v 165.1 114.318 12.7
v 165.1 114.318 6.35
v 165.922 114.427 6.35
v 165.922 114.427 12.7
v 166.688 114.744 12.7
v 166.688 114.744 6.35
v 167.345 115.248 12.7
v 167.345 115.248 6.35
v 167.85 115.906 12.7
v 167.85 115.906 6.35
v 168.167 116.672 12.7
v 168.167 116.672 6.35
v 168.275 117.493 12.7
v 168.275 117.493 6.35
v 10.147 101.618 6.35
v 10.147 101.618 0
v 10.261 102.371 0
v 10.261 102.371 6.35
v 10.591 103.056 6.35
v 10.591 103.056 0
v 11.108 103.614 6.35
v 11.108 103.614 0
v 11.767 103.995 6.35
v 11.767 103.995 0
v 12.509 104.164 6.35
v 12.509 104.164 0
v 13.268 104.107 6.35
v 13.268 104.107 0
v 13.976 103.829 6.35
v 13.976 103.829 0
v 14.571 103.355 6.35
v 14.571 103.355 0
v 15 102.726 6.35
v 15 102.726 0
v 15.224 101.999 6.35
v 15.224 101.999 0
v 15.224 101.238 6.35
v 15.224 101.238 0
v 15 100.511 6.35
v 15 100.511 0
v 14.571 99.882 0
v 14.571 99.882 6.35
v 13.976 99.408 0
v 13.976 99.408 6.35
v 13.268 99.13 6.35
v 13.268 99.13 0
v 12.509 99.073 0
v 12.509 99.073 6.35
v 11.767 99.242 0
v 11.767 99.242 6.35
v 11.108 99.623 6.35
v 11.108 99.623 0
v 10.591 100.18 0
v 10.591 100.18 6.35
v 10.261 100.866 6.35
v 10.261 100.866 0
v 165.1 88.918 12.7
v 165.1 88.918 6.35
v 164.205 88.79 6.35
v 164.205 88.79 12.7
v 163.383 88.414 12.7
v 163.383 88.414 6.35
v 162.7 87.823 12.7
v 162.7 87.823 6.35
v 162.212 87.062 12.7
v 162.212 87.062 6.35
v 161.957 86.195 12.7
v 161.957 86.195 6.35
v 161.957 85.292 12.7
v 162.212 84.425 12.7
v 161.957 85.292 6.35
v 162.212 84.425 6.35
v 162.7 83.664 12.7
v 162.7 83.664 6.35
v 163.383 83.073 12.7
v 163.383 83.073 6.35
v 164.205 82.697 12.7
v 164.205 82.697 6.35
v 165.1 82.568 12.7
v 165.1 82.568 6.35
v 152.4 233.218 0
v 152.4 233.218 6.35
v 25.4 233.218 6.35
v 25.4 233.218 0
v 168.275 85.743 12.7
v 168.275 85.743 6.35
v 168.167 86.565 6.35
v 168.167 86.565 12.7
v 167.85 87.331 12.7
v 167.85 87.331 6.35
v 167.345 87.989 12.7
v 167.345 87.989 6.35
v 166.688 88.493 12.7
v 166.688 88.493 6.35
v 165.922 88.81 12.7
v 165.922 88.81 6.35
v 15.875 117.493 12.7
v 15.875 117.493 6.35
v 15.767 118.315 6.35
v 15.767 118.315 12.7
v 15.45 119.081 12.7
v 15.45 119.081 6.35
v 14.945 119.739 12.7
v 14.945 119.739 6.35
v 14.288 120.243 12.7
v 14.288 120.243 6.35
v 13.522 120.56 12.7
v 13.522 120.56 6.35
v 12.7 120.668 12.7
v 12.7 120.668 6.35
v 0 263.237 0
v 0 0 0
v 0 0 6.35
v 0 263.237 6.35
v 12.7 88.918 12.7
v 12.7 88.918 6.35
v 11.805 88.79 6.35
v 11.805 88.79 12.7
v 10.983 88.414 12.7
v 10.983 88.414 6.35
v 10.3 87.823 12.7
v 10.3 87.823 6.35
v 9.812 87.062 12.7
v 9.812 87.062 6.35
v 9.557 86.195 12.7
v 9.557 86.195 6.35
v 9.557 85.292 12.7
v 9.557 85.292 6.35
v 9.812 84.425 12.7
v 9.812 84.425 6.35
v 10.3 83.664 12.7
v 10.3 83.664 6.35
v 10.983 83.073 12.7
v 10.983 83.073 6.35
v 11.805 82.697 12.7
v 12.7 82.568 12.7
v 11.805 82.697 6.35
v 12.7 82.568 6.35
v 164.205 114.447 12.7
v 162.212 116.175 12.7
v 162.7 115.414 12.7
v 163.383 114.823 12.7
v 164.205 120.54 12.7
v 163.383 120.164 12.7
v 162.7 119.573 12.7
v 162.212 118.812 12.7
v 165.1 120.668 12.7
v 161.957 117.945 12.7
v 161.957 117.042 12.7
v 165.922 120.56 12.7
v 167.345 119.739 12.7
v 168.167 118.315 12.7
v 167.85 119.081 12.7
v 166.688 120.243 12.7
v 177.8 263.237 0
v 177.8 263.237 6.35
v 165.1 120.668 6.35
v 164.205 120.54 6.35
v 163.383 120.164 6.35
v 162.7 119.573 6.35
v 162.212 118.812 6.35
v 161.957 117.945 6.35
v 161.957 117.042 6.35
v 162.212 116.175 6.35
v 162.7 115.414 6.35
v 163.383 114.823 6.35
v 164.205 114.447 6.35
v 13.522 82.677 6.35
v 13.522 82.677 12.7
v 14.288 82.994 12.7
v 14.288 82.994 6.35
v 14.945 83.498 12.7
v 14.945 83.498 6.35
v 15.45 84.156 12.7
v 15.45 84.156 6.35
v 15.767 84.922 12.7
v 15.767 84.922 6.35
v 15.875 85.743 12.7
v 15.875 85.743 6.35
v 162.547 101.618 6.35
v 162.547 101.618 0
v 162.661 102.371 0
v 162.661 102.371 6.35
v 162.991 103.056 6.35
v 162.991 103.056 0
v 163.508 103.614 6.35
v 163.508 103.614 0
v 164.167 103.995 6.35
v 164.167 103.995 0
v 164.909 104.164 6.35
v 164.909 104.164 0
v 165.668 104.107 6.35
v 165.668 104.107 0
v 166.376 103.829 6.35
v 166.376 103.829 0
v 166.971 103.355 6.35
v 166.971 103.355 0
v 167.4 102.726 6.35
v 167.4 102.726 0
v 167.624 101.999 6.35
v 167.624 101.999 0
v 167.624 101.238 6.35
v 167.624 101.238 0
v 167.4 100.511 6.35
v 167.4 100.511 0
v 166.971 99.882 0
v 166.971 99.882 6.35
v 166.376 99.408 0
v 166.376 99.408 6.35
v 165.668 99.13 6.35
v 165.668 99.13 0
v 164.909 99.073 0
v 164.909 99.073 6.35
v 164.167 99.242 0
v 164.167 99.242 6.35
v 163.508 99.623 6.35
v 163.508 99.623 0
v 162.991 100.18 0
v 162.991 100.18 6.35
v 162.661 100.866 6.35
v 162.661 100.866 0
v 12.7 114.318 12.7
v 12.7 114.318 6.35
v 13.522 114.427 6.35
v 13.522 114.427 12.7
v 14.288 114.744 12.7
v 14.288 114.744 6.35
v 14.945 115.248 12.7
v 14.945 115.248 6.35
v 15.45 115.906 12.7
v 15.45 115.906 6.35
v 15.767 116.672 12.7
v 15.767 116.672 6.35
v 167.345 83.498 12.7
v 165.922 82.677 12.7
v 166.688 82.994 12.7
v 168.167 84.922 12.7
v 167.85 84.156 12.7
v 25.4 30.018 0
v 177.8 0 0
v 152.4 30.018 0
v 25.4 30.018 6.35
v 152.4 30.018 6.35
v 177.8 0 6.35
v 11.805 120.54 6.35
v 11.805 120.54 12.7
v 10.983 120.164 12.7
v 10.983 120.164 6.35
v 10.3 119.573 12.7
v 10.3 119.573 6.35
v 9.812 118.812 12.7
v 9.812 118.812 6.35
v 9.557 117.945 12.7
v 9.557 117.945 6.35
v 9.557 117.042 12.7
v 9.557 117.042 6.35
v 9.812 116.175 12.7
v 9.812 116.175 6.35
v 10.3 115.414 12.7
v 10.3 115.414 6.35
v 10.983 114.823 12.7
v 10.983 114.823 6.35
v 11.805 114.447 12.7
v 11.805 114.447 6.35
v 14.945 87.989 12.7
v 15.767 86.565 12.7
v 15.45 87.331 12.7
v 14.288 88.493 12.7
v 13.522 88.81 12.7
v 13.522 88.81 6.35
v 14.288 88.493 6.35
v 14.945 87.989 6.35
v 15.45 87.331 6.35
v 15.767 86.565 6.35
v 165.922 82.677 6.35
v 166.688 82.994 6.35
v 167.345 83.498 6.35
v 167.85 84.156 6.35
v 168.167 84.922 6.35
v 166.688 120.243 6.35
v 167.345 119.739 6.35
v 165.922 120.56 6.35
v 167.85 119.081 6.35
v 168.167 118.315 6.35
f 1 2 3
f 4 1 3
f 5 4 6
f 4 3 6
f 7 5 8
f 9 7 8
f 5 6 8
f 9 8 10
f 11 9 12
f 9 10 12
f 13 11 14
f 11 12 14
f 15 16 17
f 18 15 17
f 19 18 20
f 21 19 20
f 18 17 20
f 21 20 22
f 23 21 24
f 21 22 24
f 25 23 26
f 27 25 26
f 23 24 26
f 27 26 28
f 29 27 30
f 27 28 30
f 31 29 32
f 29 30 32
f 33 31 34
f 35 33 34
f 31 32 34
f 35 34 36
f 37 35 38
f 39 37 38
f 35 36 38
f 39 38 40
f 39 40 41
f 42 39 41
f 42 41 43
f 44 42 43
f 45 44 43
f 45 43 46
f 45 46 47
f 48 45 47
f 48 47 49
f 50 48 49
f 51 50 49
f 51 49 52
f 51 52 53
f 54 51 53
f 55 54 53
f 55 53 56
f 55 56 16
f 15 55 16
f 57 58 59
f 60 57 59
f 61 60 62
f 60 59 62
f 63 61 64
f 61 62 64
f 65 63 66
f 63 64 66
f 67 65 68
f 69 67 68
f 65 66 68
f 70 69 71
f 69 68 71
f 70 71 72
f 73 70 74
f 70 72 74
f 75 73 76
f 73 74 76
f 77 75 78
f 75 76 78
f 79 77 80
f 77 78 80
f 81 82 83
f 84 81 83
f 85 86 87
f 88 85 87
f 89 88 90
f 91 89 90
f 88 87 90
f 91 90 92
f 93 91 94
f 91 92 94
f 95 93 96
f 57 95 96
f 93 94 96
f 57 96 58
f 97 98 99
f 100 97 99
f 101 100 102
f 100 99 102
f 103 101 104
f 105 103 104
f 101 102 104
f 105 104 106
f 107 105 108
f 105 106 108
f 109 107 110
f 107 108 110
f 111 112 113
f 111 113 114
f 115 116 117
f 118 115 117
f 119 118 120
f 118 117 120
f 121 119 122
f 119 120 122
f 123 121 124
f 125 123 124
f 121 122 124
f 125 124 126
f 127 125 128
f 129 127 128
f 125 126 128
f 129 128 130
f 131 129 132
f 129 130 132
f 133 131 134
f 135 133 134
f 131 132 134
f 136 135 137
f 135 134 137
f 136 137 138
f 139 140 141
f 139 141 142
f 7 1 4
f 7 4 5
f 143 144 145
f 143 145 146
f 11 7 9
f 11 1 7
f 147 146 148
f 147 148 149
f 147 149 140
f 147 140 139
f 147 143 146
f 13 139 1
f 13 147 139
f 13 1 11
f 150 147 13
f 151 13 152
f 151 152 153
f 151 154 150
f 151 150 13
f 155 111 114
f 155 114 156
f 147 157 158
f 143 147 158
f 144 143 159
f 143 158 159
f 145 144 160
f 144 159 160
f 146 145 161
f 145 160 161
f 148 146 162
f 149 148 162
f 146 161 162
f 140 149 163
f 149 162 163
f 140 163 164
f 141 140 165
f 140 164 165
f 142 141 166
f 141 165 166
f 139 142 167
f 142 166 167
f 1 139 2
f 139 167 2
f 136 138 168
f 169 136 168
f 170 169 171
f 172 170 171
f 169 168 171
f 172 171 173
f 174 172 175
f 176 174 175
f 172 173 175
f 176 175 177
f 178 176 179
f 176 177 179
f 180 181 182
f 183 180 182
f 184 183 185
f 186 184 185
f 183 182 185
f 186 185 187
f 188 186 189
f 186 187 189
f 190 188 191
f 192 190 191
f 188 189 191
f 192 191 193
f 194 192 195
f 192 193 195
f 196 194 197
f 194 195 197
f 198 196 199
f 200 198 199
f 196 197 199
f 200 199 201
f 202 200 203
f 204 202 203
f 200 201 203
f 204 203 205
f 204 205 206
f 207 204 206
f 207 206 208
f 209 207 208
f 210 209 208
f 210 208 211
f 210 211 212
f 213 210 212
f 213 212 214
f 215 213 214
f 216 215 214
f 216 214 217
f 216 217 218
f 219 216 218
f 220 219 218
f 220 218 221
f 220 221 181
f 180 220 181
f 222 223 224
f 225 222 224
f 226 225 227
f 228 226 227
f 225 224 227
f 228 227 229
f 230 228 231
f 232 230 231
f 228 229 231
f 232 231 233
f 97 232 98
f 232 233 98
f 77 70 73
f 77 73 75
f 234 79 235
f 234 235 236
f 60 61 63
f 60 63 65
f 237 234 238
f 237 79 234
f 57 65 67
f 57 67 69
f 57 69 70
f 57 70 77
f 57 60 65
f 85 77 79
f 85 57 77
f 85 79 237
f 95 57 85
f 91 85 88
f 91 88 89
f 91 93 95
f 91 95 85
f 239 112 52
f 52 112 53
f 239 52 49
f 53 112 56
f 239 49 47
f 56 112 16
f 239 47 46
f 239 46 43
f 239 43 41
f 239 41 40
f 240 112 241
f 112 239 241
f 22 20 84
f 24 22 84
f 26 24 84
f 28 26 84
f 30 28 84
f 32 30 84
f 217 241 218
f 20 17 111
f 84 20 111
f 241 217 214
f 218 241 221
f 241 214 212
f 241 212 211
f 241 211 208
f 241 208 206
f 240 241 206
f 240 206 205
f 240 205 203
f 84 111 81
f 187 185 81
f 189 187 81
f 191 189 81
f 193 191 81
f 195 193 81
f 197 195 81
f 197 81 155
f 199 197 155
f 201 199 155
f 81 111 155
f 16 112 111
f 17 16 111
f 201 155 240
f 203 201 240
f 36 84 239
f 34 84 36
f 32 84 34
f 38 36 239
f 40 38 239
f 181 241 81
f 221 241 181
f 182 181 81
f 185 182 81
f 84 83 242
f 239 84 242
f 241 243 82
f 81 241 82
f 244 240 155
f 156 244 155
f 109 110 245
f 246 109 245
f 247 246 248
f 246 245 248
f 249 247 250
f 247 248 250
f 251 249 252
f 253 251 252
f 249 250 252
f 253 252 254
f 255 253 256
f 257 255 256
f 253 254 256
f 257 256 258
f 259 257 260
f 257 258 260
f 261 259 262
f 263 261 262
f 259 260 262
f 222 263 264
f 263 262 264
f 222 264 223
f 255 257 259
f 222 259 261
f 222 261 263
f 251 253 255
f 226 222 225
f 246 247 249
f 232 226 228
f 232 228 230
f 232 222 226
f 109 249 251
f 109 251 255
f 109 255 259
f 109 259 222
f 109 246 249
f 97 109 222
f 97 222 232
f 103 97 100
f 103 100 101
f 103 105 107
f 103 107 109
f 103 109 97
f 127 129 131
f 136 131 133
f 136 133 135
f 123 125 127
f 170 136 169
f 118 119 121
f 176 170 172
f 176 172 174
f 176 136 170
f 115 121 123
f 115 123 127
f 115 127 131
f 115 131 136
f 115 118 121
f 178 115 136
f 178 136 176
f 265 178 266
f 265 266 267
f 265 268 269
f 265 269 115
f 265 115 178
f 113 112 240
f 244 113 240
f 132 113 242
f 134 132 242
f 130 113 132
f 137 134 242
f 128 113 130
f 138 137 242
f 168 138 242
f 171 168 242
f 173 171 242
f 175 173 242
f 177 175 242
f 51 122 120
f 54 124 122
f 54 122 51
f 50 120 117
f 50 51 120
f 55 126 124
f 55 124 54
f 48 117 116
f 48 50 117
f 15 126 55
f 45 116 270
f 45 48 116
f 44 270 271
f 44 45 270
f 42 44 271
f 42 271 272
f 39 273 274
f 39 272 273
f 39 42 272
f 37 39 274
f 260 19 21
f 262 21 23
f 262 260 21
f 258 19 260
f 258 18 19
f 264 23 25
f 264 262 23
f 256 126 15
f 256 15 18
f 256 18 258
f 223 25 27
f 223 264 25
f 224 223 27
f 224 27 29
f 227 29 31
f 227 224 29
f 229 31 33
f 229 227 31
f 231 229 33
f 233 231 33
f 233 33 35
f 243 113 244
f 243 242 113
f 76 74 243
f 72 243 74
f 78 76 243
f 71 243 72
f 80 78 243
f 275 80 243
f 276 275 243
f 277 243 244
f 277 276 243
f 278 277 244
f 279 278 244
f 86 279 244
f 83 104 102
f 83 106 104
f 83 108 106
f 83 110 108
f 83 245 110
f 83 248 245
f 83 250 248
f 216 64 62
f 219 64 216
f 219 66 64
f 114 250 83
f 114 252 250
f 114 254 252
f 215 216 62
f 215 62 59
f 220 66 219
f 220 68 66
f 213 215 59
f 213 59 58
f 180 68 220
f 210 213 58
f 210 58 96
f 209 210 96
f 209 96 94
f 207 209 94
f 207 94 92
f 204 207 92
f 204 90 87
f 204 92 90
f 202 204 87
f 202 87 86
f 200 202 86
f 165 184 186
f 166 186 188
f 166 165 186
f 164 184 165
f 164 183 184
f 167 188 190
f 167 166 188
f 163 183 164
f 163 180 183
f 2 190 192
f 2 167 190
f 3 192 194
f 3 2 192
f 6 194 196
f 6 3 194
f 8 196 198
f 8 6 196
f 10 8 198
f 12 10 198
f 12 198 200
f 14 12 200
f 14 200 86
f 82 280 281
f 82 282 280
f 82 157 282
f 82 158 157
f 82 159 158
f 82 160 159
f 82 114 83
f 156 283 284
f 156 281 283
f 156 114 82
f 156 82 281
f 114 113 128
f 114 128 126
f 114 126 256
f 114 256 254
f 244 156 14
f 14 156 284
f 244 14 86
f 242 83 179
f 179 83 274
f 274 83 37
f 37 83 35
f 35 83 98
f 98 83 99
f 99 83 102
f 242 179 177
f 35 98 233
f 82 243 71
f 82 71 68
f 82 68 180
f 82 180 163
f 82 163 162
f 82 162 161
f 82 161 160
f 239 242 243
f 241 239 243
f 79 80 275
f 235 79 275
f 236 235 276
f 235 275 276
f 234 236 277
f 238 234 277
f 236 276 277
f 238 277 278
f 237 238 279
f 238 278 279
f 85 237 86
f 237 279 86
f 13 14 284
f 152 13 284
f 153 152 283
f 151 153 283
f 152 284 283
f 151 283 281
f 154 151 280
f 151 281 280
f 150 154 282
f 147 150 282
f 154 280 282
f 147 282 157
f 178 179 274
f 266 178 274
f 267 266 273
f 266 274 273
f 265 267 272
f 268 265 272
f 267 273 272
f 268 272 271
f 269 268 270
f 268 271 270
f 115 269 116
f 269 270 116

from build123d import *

# Parameters (mm, degrees)
F0_W     = 177.8
F0_H     = 263.2369608608
F1_DEPTH = 6.35
F2_W     = 63.5
F2_H     = 101.6
F3_DEPTH = 25
F5_D     = 5.1054
F6_DEPTH = 6.35


with BuildPart() as f1:
    # F0 (on Top) → F1 (new body)
    with BuildSketch(Plane.XY):
        with Locations((88.9, 131.6184804304)):
            Rectangle(F0_W, F0_H)
    extrude(amount=F1_DEPTH)

    # F2 (on face) → F3 (cut)
    with BuildSketch(Plane.XY.offset(6.35)):
        with Locations((57.15, 182.4184804304)):
            Rectangle(F2_W, F2_H)
        with Locations((57.15, 80.8184804304)):
            Rectangle(F2_W, F2_H)
        with Locations((120.65, 182.4184804304)):
            Rectangle(F2_W, F2_H)
        with Locations((120.65, 80.8184804304)):
            Rectangle(F2_W, F2_H)
    extrude(amount=-F3_DEPTH, mode=Mode.SUBTRACT)

    # F5 (through all)
    with Locations(Plane.XY.offset(6.35)):
        with Locations((12.7, 101.6184804304), (165.1, 101.6184804304)):
            Hole(F5_D / 2)

    # F4 (on face) → F6 (join)
    with BuildSketch(Plane.XY.offset(6.35)):
        with BuildLine():
            ThreePointArc((168.275, 117.4934804304), (167.3450640303, 119.7385444607), (165.1, 120.6684804304))
            Line((165.1, 120.6684804304), (165.1, 114.3184804304))
            ThreePointArc((165.1, 114.3184804304), (167.3450640303, 115.2484164001), (168.275, 117.4934804304))
        make_face()
        with BuildLine():
            Line((165.1, 114.3184804304), (165.1, 120.6684804304))
            ThreePointArc((165.1, 120.6684804304), (161.925, 117.4934804304), (165.1, 114.3184804304))
        make_face()
        with BuildLine():
            ThreePointArc((168.275, 85.7434804304), (167.3450640303, 87.9885444607), (165.1, 88.9184804304))
            Line((165.1, 88.9184804304), (165.1, 82.5684804304))
            ThreePointArc((165.1, 82.5684804304), (167.3450640303, 83.4984164001), (168.275, 85.7434804304))
        make_face()
        with BuildLine():
            Line((165.1, 82.5684804304), (165.1, 88.9184804304))
            ThreePointArc((165.1, 88.9184804304), (161.925, 85.7434804304), (165.1, 82.5684804304))
        make_face()
        with BuildLine():
            ThreePointArc((15.875, 85.7434804304), (14.9450640303, 87.9885444607), (12.7, 88.9184804304))
            Line((12.7, 88.9184804304), (12.7, 82.5684804304))
            ThreePointArc((12.7, 82.5684804304), (14.9450640303, 83.4984164001), (15.875, 85.7434804304))
        make_face()
        with BuildLine():
            Line((12.7, 82.5684804304), (12.7, 88.9184804304))
            ThreePointArc((12.7, 88.9184804304), (9.525, 85.7434804304), (12.7, 82.5684804304))
        make_face()
        with BuildLine():
            ThreePointArc((15.875, 117.4934804304), (14.9450640303, 119.7385444607), (12.7, 120.6684804304))
            Line((12.7, 120.6684804304), (12.7, 114.3184804304))
            ThreePointArc((12.7, 114.3184804304), (14.9450640303, 115.2484164001), (15.875, 117.4934804304))
        make_face()
        with BuildLine():
            Line((12.7, 114.3184804304), (12.7, 120.6684804304))
            ThreePointArc((12.7, 120.6684804304), (9.525, 117.4934804304), (12.7, 114.3184804304))
        make_face()
    extrude(amount=F6_DEPTH)


solid = f1.part
